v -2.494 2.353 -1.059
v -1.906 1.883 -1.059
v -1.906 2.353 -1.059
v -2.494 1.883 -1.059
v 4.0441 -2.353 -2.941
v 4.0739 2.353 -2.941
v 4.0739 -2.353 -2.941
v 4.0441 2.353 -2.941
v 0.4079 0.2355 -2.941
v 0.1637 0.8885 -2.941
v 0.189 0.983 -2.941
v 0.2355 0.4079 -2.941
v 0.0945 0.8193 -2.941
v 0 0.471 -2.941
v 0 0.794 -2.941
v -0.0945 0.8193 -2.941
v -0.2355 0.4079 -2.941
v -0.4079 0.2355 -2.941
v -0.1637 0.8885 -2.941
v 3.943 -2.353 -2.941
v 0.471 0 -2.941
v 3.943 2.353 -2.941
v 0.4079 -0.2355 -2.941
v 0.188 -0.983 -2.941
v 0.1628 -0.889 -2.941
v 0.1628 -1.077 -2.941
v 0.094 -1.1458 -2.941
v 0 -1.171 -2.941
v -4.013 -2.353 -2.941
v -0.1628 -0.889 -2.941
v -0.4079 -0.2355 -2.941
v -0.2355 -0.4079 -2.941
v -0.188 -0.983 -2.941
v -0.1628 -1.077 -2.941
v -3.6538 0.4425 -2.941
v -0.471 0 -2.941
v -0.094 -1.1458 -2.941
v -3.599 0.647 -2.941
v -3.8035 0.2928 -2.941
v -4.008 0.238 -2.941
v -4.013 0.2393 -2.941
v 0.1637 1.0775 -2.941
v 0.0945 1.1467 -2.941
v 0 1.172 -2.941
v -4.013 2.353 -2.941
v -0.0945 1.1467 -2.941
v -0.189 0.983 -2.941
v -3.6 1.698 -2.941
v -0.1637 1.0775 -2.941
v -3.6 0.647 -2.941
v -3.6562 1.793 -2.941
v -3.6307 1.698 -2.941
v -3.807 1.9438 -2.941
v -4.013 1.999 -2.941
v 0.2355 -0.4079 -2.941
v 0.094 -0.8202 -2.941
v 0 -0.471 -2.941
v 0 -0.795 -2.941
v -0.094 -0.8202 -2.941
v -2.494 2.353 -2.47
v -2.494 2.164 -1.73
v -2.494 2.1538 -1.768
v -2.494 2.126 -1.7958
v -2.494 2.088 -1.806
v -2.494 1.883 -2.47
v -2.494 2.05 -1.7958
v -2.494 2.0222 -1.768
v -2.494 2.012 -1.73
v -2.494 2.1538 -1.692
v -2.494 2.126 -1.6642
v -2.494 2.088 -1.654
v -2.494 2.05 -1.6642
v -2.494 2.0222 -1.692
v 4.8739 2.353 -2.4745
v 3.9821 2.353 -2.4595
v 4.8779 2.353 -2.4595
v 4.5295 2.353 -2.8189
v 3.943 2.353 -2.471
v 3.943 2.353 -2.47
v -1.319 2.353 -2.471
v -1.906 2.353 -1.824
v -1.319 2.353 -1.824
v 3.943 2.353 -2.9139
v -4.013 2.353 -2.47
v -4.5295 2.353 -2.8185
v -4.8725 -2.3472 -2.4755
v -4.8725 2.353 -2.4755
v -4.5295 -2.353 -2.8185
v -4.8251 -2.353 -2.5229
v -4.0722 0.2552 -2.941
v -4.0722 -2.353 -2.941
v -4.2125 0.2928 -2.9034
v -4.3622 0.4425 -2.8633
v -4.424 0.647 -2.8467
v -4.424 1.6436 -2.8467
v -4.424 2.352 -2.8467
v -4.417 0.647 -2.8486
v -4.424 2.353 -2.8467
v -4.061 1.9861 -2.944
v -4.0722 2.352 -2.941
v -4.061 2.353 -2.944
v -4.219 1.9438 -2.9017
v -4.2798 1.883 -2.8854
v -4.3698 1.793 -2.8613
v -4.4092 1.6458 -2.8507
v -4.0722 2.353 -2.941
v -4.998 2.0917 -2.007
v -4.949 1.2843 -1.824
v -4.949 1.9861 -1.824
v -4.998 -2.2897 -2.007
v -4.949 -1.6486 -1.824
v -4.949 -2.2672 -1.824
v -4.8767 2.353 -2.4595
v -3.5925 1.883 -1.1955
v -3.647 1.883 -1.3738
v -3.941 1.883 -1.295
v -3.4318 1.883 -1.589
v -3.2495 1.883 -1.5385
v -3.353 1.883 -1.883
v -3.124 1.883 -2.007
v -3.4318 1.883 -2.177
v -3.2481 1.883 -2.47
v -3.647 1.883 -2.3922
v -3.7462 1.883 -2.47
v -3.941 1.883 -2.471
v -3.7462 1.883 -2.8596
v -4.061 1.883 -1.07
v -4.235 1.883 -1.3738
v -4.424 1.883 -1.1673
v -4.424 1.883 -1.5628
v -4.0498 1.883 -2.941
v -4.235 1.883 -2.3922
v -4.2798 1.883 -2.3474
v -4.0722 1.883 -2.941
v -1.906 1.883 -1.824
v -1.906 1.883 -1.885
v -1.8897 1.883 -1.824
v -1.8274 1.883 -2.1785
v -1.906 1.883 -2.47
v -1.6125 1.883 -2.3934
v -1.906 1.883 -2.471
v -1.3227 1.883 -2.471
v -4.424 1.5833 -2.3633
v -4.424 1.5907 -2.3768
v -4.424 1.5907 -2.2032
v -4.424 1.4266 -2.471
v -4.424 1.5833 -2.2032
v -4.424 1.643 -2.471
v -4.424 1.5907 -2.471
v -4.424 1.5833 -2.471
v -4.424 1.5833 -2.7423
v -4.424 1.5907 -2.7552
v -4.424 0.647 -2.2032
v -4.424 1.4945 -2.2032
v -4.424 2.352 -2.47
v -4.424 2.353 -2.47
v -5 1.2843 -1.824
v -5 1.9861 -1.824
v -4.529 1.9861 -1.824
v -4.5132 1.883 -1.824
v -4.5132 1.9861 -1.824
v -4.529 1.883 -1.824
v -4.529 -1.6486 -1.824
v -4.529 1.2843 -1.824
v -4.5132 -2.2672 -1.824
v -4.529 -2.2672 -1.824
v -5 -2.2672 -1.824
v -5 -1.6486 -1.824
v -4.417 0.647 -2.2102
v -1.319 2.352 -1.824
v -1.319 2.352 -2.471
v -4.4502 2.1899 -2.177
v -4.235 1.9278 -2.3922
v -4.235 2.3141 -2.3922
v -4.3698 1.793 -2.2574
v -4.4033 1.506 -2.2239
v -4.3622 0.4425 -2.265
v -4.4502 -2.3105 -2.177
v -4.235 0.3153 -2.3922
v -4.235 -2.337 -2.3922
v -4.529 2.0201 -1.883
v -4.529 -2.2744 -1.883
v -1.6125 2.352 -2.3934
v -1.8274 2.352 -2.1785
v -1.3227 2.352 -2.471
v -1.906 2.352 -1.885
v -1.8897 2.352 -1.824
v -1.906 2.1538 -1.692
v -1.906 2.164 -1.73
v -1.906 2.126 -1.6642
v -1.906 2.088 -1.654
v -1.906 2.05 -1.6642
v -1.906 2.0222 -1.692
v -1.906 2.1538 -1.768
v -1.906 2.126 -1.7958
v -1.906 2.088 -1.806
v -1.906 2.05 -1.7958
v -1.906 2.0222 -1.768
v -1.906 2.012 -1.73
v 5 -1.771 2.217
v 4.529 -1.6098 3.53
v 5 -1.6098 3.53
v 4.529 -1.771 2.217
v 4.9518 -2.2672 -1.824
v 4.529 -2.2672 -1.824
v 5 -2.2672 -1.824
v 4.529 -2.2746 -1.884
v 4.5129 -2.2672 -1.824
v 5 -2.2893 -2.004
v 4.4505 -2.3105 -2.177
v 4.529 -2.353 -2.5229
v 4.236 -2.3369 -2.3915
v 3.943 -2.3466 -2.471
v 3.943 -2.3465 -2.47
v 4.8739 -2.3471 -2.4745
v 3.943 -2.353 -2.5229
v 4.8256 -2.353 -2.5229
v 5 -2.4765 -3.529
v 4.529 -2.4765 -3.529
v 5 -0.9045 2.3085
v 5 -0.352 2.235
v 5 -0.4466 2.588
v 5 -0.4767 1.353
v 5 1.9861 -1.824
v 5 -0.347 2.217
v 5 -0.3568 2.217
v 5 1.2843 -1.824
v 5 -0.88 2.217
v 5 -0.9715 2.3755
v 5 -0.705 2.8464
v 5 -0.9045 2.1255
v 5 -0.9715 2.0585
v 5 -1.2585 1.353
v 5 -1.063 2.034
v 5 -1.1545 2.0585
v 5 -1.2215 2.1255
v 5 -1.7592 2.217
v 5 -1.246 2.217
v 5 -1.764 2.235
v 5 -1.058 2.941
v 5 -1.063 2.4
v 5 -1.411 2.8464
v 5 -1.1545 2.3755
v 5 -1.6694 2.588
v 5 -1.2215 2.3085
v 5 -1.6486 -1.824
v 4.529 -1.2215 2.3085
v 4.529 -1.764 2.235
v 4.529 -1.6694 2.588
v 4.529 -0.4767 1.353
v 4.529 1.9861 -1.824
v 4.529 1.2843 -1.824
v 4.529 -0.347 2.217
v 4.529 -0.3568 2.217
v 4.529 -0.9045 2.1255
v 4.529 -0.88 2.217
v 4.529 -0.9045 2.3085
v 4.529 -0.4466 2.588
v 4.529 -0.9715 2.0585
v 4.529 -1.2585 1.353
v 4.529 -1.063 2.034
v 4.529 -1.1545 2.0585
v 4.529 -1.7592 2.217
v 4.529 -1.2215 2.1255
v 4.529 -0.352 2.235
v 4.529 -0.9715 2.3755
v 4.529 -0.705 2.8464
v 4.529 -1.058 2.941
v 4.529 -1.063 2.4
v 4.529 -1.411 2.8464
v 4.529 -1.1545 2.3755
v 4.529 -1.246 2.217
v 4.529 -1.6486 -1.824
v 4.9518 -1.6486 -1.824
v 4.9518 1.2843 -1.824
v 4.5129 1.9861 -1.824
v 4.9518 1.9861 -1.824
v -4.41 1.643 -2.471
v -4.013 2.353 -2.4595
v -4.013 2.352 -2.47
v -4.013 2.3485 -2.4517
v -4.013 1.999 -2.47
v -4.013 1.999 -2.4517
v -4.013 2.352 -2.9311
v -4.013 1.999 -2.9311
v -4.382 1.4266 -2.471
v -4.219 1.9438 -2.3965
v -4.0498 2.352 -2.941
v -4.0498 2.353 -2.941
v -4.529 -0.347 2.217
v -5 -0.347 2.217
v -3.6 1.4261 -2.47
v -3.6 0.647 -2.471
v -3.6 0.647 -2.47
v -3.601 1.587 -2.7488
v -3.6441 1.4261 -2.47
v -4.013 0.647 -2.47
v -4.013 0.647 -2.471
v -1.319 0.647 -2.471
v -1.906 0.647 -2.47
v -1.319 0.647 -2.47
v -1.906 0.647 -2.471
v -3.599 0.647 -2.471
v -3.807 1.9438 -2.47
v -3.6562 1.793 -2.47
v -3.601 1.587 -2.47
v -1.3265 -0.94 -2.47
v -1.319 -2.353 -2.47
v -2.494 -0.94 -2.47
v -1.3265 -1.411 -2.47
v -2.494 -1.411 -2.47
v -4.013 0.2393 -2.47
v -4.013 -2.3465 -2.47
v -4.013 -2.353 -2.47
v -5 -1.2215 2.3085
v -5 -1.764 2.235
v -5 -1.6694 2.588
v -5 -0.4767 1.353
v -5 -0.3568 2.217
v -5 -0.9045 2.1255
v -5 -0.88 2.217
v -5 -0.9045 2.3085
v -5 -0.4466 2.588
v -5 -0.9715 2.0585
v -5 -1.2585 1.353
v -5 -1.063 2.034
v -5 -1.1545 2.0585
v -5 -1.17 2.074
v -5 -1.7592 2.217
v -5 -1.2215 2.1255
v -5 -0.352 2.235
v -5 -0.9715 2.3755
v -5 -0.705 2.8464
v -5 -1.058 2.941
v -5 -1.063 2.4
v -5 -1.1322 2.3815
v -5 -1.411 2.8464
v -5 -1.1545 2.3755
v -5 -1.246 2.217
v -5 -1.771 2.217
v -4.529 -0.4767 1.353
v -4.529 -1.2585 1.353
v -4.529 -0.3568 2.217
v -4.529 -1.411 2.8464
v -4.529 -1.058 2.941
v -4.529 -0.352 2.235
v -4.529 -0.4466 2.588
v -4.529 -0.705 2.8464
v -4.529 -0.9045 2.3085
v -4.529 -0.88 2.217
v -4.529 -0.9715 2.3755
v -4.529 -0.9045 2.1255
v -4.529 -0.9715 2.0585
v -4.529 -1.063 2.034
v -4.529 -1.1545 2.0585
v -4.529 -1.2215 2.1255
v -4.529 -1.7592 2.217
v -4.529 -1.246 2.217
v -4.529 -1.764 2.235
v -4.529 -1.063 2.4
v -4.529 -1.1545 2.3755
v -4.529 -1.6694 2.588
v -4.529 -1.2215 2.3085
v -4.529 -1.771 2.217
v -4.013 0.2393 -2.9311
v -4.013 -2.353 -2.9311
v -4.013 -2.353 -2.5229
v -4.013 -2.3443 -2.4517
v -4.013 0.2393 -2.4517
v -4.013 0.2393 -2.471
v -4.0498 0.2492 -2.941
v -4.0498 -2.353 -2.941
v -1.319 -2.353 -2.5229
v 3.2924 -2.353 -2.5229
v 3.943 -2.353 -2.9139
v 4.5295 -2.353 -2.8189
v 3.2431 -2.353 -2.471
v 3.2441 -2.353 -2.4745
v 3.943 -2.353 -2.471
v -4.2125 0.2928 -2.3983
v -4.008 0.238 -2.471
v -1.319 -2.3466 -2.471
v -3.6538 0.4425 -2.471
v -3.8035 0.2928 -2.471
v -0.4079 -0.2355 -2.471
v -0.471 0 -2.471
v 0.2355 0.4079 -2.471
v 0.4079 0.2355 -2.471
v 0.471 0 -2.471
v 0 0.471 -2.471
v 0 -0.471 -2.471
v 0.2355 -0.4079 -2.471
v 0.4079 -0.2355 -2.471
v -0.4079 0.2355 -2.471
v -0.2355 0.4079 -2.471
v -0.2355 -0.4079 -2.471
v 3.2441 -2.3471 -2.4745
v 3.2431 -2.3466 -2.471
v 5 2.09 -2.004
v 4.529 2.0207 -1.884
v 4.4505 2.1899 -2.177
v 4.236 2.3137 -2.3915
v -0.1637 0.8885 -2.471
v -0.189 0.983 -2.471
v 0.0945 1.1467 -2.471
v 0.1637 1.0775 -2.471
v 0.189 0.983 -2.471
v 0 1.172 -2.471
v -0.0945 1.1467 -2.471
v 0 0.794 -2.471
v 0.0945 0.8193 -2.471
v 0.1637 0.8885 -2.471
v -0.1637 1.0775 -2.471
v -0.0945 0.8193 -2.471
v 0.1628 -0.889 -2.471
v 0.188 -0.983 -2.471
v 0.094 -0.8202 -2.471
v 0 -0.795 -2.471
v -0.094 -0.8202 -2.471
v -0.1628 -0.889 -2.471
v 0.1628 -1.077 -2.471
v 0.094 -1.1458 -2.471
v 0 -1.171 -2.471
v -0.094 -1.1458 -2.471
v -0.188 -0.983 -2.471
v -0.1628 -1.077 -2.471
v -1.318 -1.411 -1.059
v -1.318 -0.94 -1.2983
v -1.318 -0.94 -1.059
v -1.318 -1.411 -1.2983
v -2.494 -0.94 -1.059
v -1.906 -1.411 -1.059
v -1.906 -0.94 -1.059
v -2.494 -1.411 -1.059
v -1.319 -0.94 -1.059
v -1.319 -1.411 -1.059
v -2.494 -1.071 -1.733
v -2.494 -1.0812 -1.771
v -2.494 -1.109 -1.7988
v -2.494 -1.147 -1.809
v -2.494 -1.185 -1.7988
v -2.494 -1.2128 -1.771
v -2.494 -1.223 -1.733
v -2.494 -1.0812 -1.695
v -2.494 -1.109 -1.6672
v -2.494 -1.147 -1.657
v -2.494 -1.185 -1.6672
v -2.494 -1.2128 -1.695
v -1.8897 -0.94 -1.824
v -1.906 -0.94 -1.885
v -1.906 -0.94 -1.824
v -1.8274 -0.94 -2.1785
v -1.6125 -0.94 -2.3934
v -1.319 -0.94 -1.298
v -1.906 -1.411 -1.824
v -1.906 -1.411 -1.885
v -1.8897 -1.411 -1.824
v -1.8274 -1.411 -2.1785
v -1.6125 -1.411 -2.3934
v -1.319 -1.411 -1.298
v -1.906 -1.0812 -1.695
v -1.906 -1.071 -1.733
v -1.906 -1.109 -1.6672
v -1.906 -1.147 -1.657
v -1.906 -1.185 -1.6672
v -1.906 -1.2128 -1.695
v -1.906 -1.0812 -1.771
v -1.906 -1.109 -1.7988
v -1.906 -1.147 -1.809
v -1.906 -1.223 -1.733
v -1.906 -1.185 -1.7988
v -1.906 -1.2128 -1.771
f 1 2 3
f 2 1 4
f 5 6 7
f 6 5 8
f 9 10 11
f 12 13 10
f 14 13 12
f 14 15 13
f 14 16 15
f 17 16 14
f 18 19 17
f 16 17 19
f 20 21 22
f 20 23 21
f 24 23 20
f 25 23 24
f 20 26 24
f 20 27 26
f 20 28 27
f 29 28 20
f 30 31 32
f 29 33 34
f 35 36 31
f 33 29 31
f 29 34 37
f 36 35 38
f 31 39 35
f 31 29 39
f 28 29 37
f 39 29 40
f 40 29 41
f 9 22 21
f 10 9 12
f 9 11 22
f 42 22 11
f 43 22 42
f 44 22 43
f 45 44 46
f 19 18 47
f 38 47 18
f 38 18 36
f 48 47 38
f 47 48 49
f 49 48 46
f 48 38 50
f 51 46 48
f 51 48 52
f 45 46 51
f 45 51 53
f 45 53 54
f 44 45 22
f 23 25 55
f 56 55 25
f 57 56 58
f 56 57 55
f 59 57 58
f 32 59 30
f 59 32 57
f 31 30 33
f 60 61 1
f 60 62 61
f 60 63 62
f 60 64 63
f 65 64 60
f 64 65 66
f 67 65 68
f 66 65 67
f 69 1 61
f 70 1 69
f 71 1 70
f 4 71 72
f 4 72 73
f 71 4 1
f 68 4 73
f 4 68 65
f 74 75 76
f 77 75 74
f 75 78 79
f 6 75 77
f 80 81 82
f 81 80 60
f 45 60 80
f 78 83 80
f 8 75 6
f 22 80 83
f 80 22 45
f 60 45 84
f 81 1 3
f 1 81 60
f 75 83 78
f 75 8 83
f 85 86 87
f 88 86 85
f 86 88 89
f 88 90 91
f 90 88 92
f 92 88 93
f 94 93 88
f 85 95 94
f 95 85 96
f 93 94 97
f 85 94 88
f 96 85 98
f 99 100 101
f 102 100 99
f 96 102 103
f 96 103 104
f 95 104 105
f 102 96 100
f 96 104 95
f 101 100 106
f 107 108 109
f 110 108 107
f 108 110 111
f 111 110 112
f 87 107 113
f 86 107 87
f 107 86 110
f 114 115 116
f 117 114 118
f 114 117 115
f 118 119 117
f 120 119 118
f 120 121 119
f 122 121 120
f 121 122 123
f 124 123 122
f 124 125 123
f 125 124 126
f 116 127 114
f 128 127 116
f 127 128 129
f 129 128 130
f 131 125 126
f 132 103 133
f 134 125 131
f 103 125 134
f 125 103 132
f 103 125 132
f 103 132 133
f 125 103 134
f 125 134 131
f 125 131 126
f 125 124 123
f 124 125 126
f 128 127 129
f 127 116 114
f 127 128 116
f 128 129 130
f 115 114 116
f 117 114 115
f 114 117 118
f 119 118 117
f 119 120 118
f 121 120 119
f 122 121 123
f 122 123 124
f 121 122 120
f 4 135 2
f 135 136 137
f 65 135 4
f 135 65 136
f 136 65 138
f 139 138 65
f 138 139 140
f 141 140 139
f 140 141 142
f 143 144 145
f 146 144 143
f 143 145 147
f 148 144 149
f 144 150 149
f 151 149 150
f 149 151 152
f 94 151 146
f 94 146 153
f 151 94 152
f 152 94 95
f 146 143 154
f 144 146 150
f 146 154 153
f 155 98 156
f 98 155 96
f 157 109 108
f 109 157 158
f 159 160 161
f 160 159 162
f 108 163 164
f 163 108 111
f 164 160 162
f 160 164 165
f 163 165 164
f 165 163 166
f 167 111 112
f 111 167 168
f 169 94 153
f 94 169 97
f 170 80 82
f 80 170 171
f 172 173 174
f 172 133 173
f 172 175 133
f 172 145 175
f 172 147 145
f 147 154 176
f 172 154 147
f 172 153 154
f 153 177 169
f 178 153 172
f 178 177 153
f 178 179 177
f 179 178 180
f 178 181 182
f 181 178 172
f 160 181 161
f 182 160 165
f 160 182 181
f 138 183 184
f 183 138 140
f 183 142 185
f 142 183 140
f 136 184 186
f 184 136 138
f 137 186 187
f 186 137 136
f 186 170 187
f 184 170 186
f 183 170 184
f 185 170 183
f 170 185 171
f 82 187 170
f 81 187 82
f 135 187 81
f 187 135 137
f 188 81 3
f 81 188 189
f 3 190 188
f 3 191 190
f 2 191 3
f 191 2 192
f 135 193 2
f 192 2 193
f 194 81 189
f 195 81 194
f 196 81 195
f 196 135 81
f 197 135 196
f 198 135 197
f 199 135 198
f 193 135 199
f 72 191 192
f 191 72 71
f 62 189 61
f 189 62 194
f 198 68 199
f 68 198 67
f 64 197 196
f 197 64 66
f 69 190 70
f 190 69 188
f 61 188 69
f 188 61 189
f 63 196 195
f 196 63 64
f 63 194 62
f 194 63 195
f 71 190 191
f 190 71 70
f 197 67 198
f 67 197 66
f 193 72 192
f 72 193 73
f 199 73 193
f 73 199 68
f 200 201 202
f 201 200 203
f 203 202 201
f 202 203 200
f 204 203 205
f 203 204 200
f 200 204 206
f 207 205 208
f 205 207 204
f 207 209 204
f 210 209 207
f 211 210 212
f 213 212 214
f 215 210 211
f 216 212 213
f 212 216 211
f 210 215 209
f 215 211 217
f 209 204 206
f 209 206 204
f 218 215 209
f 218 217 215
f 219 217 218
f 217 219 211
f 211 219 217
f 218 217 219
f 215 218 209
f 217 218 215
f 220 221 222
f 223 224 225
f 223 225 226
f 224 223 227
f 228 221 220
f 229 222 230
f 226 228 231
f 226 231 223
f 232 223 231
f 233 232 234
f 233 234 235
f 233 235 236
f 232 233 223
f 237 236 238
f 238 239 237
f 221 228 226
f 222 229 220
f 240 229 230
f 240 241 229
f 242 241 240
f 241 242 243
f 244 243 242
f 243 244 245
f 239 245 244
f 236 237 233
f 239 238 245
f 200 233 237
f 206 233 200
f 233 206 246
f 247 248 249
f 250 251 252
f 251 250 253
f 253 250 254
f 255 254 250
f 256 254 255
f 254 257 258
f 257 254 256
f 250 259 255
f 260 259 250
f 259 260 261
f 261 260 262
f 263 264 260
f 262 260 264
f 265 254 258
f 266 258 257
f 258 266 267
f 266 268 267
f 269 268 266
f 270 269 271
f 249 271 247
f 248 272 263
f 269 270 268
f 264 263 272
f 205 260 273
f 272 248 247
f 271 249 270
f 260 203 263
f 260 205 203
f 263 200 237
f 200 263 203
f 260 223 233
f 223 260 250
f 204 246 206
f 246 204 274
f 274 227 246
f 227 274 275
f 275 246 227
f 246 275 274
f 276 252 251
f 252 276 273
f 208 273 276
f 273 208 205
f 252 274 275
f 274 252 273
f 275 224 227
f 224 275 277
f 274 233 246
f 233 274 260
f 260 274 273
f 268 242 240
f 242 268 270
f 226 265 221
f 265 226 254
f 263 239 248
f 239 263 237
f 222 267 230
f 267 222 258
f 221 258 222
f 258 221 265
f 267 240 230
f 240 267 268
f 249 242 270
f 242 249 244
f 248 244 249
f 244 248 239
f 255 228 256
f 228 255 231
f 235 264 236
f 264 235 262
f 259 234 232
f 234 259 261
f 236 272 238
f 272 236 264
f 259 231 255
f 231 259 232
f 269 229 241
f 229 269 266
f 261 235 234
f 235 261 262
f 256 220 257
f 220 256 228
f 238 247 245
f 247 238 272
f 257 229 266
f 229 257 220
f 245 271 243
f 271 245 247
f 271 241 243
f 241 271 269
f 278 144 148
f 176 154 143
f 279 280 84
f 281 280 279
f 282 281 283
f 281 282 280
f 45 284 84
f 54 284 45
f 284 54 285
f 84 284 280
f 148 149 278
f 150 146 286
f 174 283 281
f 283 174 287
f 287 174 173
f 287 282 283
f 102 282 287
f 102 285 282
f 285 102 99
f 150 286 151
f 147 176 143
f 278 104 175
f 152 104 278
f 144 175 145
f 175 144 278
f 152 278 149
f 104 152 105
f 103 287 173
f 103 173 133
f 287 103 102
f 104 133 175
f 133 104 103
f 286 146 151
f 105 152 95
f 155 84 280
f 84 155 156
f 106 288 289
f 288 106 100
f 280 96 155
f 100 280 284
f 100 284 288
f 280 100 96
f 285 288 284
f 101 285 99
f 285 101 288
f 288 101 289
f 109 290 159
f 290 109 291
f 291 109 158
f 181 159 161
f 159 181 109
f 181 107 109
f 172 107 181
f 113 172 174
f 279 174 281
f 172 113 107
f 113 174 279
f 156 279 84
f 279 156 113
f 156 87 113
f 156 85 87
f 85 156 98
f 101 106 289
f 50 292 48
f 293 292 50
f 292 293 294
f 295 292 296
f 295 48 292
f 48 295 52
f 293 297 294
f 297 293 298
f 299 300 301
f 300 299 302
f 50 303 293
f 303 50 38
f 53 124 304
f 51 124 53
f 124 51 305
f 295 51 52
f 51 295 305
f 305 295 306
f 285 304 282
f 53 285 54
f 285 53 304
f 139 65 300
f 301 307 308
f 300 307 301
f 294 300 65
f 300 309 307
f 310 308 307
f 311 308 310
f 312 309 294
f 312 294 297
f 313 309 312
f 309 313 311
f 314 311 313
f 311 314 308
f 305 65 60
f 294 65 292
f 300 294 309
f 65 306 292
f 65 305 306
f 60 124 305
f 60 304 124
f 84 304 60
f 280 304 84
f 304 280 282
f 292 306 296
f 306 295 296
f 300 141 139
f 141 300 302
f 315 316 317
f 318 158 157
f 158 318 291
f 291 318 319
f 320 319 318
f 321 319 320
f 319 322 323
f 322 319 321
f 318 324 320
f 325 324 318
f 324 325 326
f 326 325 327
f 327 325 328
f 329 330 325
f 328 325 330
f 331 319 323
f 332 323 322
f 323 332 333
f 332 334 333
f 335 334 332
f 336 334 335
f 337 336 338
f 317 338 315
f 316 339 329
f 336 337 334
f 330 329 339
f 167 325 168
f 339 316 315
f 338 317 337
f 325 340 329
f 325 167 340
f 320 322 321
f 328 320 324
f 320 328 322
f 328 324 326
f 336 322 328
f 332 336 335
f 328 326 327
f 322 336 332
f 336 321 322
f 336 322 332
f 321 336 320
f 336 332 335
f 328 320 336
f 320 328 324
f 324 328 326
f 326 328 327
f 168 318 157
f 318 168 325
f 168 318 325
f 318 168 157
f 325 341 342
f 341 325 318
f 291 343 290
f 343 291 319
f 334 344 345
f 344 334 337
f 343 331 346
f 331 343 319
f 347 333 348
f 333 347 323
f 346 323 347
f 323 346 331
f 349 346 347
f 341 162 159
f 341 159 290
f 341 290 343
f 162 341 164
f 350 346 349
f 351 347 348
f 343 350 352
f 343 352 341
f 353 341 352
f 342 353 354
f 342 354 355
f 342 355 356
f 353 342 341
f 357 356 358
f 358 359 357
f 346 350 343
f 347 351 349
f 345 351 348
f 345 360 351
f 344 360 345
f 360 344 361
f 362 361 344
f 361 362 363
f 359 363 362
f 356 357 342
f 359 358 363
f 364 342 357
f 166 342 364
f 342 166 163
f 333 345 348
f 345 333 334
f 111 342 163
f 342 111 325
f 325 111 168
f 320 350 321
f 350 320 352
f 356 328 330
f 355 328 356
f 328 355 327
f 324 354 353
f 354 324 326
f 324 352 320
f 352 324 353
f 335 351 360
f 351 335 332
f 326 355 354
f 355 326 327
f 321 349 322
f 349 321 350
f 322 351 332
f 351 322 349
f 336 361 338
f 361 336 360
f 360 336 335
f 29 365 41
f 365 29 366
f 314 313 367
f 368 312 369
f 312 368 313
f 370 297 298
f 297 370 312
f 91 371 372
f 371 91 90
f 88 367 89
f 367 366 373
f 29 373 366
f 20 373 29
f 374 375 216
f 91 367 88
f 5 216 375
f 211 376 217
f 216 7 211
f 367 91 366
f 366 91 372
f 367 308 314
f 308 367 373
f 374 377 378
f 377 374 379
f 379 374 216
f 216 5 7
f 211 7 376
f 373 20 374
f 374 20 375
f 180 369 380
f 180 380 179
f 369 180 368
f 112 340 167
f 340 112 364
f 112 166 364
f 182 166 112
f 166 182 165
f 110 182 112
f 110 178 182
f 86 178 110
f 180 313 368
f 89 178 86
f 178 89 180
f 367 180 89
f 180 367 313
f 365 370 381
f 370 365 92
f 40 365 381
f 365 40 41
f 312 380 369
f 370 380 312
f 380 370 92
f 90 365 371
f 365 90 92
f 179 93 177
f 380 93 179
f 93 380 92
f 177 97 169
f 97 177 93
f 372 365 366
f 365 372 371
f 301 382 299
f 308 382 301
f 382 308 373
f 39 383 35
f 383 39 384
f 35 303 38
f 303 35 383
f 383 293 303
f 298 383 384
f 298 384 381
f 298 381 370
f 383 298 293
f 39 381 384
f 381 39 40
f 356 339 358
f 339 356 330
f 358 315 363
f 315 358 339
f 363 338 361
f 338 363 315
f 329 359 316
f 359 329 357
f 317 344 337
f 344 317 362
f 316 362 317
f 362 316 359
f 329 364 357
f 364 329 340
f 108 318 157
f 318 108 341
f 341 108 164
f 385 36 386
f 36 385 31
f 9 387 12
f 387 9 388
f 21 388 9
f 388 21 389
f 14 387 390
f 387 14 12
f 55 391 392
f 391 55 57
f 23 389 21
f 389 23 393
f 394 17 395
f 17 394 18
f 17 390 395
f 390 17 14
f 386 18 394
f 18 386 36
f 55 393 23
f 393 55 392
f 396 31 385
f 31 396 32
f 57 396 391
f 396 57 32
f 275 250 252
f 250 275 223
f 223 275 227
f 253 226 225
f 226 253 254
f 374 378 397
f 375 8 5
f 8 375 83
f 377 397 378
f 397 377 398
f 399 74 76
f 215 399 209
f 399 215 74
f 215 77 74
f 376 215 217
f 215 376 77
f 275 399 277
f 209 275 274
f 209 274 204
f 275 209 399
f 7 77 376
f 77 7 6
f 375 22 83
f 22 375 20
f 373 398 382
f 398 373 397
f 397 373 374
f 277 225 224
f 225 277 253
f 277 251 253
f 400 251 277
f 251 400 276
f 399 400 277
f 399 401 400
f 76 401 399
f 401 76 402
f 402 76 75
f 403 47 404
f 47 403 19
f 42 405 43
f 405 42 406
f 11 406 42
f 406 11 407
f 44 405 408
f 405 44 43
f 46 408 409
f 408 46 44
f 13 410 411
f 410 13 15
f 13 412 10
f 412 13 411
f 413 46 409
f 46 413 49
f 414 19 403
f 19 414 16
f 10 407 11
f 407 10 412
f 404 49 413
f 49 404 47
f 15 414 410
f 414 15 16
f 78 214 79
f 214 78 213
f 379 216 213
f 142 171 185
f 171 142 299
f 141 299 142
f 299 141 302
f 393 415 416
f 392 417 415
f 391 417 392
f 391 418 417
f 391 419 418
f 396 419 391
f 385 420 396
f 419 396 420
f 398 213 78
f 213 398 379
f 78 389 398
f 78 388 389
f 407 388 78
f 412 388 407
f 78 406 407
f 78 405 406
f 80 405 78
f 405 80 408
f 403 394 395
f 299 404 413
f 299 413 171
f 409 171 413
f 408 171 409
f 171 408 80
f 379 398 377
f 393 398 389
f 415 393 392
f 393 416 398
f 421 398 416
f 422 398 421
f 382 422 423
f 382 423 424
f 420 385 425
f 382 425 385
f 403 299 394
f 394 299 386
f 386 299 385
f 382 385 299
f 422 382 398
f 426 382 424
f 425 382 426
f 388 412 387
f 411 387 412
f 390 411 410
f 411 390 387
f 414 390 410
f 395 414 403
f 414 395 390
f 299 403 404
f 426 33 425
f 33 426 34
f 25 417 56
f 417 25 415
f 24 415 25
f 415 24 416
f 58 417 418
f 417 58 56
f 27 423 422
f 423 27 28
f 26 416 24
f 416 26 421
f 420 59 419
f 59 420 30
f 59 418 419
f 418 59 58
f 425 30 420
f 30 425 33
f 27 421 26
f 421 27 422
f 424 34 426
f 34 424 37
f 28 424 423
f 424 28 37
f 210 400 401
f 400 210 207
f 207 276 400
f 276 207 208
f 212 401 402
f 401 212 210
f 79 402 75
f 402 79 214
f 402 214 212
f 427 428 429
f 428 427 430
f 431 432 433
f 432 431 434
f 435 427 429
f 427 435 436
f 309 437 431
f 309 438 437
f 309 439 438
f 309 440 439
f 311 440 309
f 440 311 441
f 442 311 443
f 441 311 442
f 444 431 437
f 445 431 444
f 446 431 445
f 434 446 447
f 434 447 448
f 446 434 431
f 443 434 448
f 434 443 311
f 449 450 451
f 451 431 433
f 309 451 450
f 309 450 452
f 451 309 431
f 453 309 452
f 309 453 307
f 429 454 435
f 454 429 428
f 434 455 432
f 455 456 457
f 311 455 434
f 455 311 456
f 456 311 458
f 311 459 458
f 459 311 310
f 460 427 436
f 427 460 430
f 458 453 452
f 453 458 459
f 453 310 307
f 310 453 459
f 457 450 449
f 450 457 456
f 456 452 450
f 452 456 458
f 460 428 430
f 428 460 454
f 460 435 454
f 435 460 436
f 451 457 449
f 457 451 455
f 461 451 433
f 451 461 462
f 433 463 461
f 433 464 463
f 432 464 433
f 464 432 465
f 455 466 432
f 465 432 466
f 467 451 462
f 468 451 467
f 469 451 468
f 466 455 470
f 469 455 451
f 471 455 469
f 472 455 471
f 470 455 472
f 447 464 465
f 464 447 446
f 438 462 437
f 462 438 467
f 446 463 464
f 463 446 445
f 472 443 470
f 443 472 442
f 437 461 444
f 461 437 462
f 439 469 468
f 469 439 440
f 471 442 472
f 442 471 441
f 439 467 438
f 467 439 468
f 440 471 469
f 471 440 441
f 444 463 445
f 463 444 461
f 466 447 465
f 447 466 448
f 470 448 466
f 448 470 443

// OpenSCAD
intersection() {
translate([-6, -2.824, -3.529]) cube(size = [12, 5.648, 7.059], center = false);
union() {
difference() {
intersection() {
union() {
translate([-2.494, 0.647, -2.941]) cube(size = [20.594, 1.706, 1.882], center = false);
rotate([180, 90, -90])
translate([2.007, 4.061, -18.1])
cylinder(h = 19.983, r1 = 0.937, r2 = 0.937, center = false, $fn = 12);
}
union() {
translate([-18.1, 0.647, -2.941]) cube(size = [13.676, 1.706, 1.117], center = false);
translate([-4.424, 1.883, -2.941]) cube(size = [3.105, 16.217, 1.882], center = false);
}
}
union() {
rotate([180, 90, -90])
translate([1.883, 3.941, -18.1])
cylinder(h = 20.452, r1 = 0.588, r2 = 0.588, center = false, $fn = 12);
rotate([180, 90, -90])
translate([1.885, 1.319, -18.1])
cylinder(h = 20.452, r1 = 0.587, r2 = 0.587, center = false, $fn = 12);
translate([-1.906, 0.647, -1.824]) cube(size = [0.587, 1.706, 0.765], center = false);
rotate([180, 90, 180])
translate([1.73, 2.088, -4.424])
cylinder(h = 22.524, r1 = 0.076, r2 = 0.076, center = false, $fn = 12);
}
}
difference() {
union() {
difference() {
rotate([-7, 0, 0])
translate([4.529, -18.1, -18.1]) cube(size = [0.471, 16.072, 36.2], center = false);
rotate([-7, 0, 0])
translate([5, -1.414, -18.1]) cube(size = [13.1, 19.514, 36.2], center = false);
}
intersection() {
translate([4.529, -2.353, 1.353]) cube(size = [0.471, 20.453, 0.864], center = false);
rotate([29, 0, 0])
translate([4.529, -18.1, -18.1]) cube(size = [13.571, 18.34, 36.2], center = false);
}
rotate([180, 90, 180])
translate([-2.235, -1.058, 3.943])
cylinder(h = 14.157, r1 = 0.706, r2 = 0.706, center = false, $fn = 12);
difference() {
translate([-18.1, -18.1, -1.824]) cube(size = [23.1, 20.452, 4.041], center = false);
rotate([-7, 0, 0])
translate([-1.906, -1.414, -18.1]) cube(size = [6.906, 19.514, 36.2], center = false);
}
}
difference() {
translate([0, 0, 0]) sphere(r = 54.3, $fn = 12);
intersection() {
difference() {
rotate([-7, 0, 0])
translate([4.529, -2.028, -18.1]) cube(size = [0.471, 20.128, 36.2], center = false);
rotate([180, 90, 180])
translate([-2.217, -1.063, 3.943])
cylinder(h = 14.157, r1 = 0.183, r2 = 0.183, center = false, $fn = 12);
}
union() {
rotate([-7, 0, 0])
translate([-1.906, -2.028, -18.1]) cube(size = [5.849, 20.128, 36.2], center = false);
rotate([-7, 0, 0])
translate([4.529, -18.1, -18.1]) cube(size = [0.471, 36.2, 36.2], center = false);
}
}
}
}
intersection() {
difference() {
union() {
rotate([29, 0, 0])
translate([-18.1, 0.239, -18.1]) cube(size = [14.087, 17.861, 36.2], center = false);
translate([-4.424, -18.1, -18.1]) cube(size = [0.411, 19.983, 15.629], center = false);
}
union() {
rotate([180, 90, -90])
translate([1.883, 3.941, -18.1])
cylinder(h = 36.2, r1 = 0.588, r2 = 0.588, center = false, $fn = 12);
translate([-4.013, 1.587, -18.1])
cylinder(h = 36.2, r1 = 0.412, r2 = 0.412, center = false, $fn = 12);
}
}
union() {
rotate([180, 90, -90])
translate([2.007, 4.061, -18.1])
cylinder(h = 20.452, r1 = 0.937, r2 = 0.937, center = false, $fn = 12);
translate([-4.013, 1.587, -2.471])
cylinder(h = 20.571, r1 = 0.412, r2 = 0.412, center = false, $fn = 12);
difference() {
rotate([-150, 0, 0])
translate([-18.1, -18.1, -18.1]) cube(size = [14.5, 18.1, 36.2], center = false);
translate([-4.424, -18.1, -2.941]) cube(size = [0.411, 36.2, 0.471], center = false);
}
}
rotate([-150, 0, 0])
translate([-18.1, -0.808, -18.1]) cube(size = [14.087, 0.808, 36.2], center = false);
rotate([180, 90, -90])
translate([2.007, 4.061, 0.647])
cylinder(h = 1.706, r1 = 0.937, r2 = 0.937, center = false, $fn = 12);
difference() {
rotate([-150, 0, 0])
translate([-18.1, -0.808, -18.1]) cube(size = [14.5, 0.808, 36.2], center = false);
translate([-18.1, -18.1, -1.824]) cube(size = [14.087, 20.452, 0.765], center = false);
}
}
intersection() {
translate([-4.013, 0.647, -2.941]) cube(size = [2.107, 1.706, 0.471], center = false);
union() {
rotate([29, 0, 0])
translate([-3.6, -18.1, -18.1]) cube(size = [21.7, 36.2, 36.2], center = false);
rotate([-150, 0, 0])
translate([-4.424, -18.1, -18.1]) cube(size = [0.824, 18.1, 36.2], center = false);
}
difference() {
translate([-4.013, 0.647, -2.941]) cube(size = [2.694, 1.706, 1.882], center = false);
translate([-4.013, 1.587, -2.941])
cylinder(h = 0.471, r1 = 0.412, r2 = 0.412, center = false, $fn = 12);
}
}
difference() {
intersection() {
union() {
rotate([180, 90, 180])
translate([-2.235, -1.058, -5])
cylinder(h = 0.471, r1 = 0.706, r2 = 0.706, center = false, $fn = 12);
rotate([29, 0, 0])
translate([-5, -18.1, -18.1]) cube(size = [0.471, 18.34, 36.2], center = false);
intersection() {
rotate([-150, 0, 0])
translate([-18.1, -0.808, -18.1]) cube(size = [36.2, 18.908, 36.2], center = false);
rotate([90, 0, 0])
translate([-5, 1.353, -18.1]) cube(size = [23.1, 0.864, 36.2], center = false);
}
}
difference() {
difference() {
rotate([-7, 0, 0])
translate([-18.1, -1.414, -18.1]) cube(size = [13.571, 19.514, 36.2], center = false);
rotate([90, 0, 0])
translate([-18.1, -18.1, -18.1]) cube(size = [13.571, 19.453, 36.2], center = false);
}
rotate([180, 90, 180])
translate([-2.217, -1.063, -18.1])
cylinder(h = 36.2, r1 = 0.183, r2 = 0.183, center = false, $fn = 12);
}
}
intersection() {
rotate([-7, 0, 0])
translate([-18.1, -2.028, -18.1]) cube(size = [13.1, 20.128, 36.2], center = false);
rotate([-150, 0, 0])
translate([-4.529, -0.808, -18.1]) cube(size = [22.629, 18.908, 36.2], center = false);
}
}
intersection() {
difference() {
translate([-18.1, -2.353, -2.941]) cube(size = [14.087, 3, 1.117], center = false);
rotate([180, 90, -90])
translate([1.883, 3.941, -18.1])
cylinder(h = 36.2, r1 = 0.588, r2 = 0.588, center = false, $fn = 12);
}
rotate([180, 90, -90])
translate([2.007, 4.061, -2.353])
cylinder(h = 20.453, r1 = 0.937, r2 = 0.937, center = false, $fn = 12);
difference() {
rotate([-7, 0, 0])
translate([-18.1, -2.028, -18.1]) cube(size = [14.087, 20.128, 36.2], center = false);
translate([-4.008, 0.647, -2.941])
cylinder(h = 21.041, r1 = 0.409, r2 = 0.409, center = false, $fn = 12);
}
}
difference() {
translate([-4.013, -2.353, -2.941]) cube(size = [2.694, 3, 0.471], center = false);
translate([-4.008, 0.647, -18.1])
cylinder(h = 15.629, r1 = 0.409, r2 = 0.409, center = false, $fn = 12);
}
intersection() {
union() {
difference() {
rotate([-150, 0, 0])
translate([-18.1, -0.808, -18.1]) cube(size = [36.2, 18.908, 36.2], center = false);
rotate([-7, 0, 0])
translate([-18.1, -18.1, -18.1]) cube(size = [36.2, 16.686, 36.2], center = false);
}
difference() {
rotate([-7, 0, 0])
translate([-18.1, -18.1, -18.1]) cube(size = [36.2, 16.686, 36.2], center = false);
rotate([180, 90, 180])
translate([-2.217, -1.063, -18.1])
cylinder(h = 36.2, r1 = 0.183, r2 = 0.183, center = false, $fn = 12);
}
}
union() {
rotate([180, 90, 180])
translate([-2.235, -1.058, -5])
cylinder(h = 0.471, r1 = 0.706, r2 = 0.706, center = false, $fn = 12);
rotate([90, 0, 0])
translate([-5, -1.824, -18.1]) cube(size = [23.1, 4.041, 36.2], center = false);
}
union() {
rotate([-7, 0, 0])
translate([-18.1, -1.414, -18.1]) cube(size = [13.1, 19.514, 36.2], center = false);
intersection() {
rotate([29, 0, 0])
translate([-18.1, 0.239, -18.1]) cube(size = [13.571, 17.861, 36.2], center = false);
rotate([90, 0, 0])
translate([-18.1, -1.824, -18.1]) cube(size = [36.2, 3.177, 36.2], center = false);
}
rotate([-7, 0, 0])
translate([-18.1, -2.028, -18.1]) cube(size = [13.571, 0.614, 36.2], center = false);
}
}
intersection() {
union() {
difference() {
translate([-1.906, -2.353, -2.941]) cube(size = [6.906, 4.706, 1.117], center = false);
translate([0, 0, -2.941])
cylinder(h = 0.471, r1 = 0.471, r2 = 0.471, center = false, $fn = 12);
}
rotate([29, 0, 0])
translate([4.529, 0.239, -18.1]) cube(size = [0.471, 17.861, 36.2], center = false);
}
union() {
translate([4.529, -18.1, -1.824]) cube(size = [0.471, 20.452, 4.041], center = false);
rotate([180, 90, -90])
translate([2.004, -4.059, -2.353])
cylinder(h = 4.706, r1 = 0.941, r2 = 0.941, center = false, $fn = 12);
rotate([-7, 0, 0])
translate([4.529, -18.1, -18.1]) cube(size = [0.471, 16.072, 36.2], center = false);
rotate([-7, 0, 0])
translate([-1.906, -2.028, -18.1]) cube(size = [5.849, 20.128, 36.2], center = false);
}
difference() {
difference() {
rotate([-150, 0, 0])
translate([-1.906, -0.808, -18.1]) cube(size = [20.006, 18.908, 36.2], center = false);
rotate([180, 90, 180])
translate([-2.217, -1.063, -18.1])
cylinder(h = 36.2, r1 = 0.183, r2 = 0.183, center = false, $fn = 12);
}
translate([0, 0.983, -2.941])
cylinder(h = 1.117, r1 = 0.189, r2 = 0.189, center = false, $fn = 12);
}
union() {
difference() {
translate([-18.1, -18.1, -18.1]) cube(size = [22.043, 36.2, 15.629], center = false);
translate([0, -0.983, -2.941])
cylinder(h = 21.041, r1 = 0.188, r2 = 0.188, center = false, $fn = 12);
}
difference() {
rotate([-7, 0, 0])
translate([3.943, -2.028, -18.1]) cube(size = [14.157, 20.128, 36.2], center = false);
rotate([180, 90, -90])
translate([1.884, -3.943, -2.353])
cylinder(h = 20.453, r1 = 0.586, r2 = 0.586, center = false, $fn = 12);
}
}
}
intersection() {
difference() {
difference() {
translate([-2.494, -1.411, -2.471]) cube(size = [1.176, 0.471, 1.412], center = false);
rotate([180, 90, -90])
translate([1.885, 1.319, -2.353])
cylinder(h = 1.413, r1 = 0.587, r2 = 0.587, center = false, $fn = 12);
}
union() {
translate([-1.906, -1.411, -1.824]) cube(size = [0.587, 0.471, 19.924], center = false);
rotate([180, 90, 180])
translate([1.733, -1.147, -2.494])
cylinder(h = 20.594, r1 = 0.076, r2 = 0.076, center = false, $fn = 12);
}
}
translate([0, 0, 0]) sphere(r = 54.3, $fn = 12);
}
}
}
